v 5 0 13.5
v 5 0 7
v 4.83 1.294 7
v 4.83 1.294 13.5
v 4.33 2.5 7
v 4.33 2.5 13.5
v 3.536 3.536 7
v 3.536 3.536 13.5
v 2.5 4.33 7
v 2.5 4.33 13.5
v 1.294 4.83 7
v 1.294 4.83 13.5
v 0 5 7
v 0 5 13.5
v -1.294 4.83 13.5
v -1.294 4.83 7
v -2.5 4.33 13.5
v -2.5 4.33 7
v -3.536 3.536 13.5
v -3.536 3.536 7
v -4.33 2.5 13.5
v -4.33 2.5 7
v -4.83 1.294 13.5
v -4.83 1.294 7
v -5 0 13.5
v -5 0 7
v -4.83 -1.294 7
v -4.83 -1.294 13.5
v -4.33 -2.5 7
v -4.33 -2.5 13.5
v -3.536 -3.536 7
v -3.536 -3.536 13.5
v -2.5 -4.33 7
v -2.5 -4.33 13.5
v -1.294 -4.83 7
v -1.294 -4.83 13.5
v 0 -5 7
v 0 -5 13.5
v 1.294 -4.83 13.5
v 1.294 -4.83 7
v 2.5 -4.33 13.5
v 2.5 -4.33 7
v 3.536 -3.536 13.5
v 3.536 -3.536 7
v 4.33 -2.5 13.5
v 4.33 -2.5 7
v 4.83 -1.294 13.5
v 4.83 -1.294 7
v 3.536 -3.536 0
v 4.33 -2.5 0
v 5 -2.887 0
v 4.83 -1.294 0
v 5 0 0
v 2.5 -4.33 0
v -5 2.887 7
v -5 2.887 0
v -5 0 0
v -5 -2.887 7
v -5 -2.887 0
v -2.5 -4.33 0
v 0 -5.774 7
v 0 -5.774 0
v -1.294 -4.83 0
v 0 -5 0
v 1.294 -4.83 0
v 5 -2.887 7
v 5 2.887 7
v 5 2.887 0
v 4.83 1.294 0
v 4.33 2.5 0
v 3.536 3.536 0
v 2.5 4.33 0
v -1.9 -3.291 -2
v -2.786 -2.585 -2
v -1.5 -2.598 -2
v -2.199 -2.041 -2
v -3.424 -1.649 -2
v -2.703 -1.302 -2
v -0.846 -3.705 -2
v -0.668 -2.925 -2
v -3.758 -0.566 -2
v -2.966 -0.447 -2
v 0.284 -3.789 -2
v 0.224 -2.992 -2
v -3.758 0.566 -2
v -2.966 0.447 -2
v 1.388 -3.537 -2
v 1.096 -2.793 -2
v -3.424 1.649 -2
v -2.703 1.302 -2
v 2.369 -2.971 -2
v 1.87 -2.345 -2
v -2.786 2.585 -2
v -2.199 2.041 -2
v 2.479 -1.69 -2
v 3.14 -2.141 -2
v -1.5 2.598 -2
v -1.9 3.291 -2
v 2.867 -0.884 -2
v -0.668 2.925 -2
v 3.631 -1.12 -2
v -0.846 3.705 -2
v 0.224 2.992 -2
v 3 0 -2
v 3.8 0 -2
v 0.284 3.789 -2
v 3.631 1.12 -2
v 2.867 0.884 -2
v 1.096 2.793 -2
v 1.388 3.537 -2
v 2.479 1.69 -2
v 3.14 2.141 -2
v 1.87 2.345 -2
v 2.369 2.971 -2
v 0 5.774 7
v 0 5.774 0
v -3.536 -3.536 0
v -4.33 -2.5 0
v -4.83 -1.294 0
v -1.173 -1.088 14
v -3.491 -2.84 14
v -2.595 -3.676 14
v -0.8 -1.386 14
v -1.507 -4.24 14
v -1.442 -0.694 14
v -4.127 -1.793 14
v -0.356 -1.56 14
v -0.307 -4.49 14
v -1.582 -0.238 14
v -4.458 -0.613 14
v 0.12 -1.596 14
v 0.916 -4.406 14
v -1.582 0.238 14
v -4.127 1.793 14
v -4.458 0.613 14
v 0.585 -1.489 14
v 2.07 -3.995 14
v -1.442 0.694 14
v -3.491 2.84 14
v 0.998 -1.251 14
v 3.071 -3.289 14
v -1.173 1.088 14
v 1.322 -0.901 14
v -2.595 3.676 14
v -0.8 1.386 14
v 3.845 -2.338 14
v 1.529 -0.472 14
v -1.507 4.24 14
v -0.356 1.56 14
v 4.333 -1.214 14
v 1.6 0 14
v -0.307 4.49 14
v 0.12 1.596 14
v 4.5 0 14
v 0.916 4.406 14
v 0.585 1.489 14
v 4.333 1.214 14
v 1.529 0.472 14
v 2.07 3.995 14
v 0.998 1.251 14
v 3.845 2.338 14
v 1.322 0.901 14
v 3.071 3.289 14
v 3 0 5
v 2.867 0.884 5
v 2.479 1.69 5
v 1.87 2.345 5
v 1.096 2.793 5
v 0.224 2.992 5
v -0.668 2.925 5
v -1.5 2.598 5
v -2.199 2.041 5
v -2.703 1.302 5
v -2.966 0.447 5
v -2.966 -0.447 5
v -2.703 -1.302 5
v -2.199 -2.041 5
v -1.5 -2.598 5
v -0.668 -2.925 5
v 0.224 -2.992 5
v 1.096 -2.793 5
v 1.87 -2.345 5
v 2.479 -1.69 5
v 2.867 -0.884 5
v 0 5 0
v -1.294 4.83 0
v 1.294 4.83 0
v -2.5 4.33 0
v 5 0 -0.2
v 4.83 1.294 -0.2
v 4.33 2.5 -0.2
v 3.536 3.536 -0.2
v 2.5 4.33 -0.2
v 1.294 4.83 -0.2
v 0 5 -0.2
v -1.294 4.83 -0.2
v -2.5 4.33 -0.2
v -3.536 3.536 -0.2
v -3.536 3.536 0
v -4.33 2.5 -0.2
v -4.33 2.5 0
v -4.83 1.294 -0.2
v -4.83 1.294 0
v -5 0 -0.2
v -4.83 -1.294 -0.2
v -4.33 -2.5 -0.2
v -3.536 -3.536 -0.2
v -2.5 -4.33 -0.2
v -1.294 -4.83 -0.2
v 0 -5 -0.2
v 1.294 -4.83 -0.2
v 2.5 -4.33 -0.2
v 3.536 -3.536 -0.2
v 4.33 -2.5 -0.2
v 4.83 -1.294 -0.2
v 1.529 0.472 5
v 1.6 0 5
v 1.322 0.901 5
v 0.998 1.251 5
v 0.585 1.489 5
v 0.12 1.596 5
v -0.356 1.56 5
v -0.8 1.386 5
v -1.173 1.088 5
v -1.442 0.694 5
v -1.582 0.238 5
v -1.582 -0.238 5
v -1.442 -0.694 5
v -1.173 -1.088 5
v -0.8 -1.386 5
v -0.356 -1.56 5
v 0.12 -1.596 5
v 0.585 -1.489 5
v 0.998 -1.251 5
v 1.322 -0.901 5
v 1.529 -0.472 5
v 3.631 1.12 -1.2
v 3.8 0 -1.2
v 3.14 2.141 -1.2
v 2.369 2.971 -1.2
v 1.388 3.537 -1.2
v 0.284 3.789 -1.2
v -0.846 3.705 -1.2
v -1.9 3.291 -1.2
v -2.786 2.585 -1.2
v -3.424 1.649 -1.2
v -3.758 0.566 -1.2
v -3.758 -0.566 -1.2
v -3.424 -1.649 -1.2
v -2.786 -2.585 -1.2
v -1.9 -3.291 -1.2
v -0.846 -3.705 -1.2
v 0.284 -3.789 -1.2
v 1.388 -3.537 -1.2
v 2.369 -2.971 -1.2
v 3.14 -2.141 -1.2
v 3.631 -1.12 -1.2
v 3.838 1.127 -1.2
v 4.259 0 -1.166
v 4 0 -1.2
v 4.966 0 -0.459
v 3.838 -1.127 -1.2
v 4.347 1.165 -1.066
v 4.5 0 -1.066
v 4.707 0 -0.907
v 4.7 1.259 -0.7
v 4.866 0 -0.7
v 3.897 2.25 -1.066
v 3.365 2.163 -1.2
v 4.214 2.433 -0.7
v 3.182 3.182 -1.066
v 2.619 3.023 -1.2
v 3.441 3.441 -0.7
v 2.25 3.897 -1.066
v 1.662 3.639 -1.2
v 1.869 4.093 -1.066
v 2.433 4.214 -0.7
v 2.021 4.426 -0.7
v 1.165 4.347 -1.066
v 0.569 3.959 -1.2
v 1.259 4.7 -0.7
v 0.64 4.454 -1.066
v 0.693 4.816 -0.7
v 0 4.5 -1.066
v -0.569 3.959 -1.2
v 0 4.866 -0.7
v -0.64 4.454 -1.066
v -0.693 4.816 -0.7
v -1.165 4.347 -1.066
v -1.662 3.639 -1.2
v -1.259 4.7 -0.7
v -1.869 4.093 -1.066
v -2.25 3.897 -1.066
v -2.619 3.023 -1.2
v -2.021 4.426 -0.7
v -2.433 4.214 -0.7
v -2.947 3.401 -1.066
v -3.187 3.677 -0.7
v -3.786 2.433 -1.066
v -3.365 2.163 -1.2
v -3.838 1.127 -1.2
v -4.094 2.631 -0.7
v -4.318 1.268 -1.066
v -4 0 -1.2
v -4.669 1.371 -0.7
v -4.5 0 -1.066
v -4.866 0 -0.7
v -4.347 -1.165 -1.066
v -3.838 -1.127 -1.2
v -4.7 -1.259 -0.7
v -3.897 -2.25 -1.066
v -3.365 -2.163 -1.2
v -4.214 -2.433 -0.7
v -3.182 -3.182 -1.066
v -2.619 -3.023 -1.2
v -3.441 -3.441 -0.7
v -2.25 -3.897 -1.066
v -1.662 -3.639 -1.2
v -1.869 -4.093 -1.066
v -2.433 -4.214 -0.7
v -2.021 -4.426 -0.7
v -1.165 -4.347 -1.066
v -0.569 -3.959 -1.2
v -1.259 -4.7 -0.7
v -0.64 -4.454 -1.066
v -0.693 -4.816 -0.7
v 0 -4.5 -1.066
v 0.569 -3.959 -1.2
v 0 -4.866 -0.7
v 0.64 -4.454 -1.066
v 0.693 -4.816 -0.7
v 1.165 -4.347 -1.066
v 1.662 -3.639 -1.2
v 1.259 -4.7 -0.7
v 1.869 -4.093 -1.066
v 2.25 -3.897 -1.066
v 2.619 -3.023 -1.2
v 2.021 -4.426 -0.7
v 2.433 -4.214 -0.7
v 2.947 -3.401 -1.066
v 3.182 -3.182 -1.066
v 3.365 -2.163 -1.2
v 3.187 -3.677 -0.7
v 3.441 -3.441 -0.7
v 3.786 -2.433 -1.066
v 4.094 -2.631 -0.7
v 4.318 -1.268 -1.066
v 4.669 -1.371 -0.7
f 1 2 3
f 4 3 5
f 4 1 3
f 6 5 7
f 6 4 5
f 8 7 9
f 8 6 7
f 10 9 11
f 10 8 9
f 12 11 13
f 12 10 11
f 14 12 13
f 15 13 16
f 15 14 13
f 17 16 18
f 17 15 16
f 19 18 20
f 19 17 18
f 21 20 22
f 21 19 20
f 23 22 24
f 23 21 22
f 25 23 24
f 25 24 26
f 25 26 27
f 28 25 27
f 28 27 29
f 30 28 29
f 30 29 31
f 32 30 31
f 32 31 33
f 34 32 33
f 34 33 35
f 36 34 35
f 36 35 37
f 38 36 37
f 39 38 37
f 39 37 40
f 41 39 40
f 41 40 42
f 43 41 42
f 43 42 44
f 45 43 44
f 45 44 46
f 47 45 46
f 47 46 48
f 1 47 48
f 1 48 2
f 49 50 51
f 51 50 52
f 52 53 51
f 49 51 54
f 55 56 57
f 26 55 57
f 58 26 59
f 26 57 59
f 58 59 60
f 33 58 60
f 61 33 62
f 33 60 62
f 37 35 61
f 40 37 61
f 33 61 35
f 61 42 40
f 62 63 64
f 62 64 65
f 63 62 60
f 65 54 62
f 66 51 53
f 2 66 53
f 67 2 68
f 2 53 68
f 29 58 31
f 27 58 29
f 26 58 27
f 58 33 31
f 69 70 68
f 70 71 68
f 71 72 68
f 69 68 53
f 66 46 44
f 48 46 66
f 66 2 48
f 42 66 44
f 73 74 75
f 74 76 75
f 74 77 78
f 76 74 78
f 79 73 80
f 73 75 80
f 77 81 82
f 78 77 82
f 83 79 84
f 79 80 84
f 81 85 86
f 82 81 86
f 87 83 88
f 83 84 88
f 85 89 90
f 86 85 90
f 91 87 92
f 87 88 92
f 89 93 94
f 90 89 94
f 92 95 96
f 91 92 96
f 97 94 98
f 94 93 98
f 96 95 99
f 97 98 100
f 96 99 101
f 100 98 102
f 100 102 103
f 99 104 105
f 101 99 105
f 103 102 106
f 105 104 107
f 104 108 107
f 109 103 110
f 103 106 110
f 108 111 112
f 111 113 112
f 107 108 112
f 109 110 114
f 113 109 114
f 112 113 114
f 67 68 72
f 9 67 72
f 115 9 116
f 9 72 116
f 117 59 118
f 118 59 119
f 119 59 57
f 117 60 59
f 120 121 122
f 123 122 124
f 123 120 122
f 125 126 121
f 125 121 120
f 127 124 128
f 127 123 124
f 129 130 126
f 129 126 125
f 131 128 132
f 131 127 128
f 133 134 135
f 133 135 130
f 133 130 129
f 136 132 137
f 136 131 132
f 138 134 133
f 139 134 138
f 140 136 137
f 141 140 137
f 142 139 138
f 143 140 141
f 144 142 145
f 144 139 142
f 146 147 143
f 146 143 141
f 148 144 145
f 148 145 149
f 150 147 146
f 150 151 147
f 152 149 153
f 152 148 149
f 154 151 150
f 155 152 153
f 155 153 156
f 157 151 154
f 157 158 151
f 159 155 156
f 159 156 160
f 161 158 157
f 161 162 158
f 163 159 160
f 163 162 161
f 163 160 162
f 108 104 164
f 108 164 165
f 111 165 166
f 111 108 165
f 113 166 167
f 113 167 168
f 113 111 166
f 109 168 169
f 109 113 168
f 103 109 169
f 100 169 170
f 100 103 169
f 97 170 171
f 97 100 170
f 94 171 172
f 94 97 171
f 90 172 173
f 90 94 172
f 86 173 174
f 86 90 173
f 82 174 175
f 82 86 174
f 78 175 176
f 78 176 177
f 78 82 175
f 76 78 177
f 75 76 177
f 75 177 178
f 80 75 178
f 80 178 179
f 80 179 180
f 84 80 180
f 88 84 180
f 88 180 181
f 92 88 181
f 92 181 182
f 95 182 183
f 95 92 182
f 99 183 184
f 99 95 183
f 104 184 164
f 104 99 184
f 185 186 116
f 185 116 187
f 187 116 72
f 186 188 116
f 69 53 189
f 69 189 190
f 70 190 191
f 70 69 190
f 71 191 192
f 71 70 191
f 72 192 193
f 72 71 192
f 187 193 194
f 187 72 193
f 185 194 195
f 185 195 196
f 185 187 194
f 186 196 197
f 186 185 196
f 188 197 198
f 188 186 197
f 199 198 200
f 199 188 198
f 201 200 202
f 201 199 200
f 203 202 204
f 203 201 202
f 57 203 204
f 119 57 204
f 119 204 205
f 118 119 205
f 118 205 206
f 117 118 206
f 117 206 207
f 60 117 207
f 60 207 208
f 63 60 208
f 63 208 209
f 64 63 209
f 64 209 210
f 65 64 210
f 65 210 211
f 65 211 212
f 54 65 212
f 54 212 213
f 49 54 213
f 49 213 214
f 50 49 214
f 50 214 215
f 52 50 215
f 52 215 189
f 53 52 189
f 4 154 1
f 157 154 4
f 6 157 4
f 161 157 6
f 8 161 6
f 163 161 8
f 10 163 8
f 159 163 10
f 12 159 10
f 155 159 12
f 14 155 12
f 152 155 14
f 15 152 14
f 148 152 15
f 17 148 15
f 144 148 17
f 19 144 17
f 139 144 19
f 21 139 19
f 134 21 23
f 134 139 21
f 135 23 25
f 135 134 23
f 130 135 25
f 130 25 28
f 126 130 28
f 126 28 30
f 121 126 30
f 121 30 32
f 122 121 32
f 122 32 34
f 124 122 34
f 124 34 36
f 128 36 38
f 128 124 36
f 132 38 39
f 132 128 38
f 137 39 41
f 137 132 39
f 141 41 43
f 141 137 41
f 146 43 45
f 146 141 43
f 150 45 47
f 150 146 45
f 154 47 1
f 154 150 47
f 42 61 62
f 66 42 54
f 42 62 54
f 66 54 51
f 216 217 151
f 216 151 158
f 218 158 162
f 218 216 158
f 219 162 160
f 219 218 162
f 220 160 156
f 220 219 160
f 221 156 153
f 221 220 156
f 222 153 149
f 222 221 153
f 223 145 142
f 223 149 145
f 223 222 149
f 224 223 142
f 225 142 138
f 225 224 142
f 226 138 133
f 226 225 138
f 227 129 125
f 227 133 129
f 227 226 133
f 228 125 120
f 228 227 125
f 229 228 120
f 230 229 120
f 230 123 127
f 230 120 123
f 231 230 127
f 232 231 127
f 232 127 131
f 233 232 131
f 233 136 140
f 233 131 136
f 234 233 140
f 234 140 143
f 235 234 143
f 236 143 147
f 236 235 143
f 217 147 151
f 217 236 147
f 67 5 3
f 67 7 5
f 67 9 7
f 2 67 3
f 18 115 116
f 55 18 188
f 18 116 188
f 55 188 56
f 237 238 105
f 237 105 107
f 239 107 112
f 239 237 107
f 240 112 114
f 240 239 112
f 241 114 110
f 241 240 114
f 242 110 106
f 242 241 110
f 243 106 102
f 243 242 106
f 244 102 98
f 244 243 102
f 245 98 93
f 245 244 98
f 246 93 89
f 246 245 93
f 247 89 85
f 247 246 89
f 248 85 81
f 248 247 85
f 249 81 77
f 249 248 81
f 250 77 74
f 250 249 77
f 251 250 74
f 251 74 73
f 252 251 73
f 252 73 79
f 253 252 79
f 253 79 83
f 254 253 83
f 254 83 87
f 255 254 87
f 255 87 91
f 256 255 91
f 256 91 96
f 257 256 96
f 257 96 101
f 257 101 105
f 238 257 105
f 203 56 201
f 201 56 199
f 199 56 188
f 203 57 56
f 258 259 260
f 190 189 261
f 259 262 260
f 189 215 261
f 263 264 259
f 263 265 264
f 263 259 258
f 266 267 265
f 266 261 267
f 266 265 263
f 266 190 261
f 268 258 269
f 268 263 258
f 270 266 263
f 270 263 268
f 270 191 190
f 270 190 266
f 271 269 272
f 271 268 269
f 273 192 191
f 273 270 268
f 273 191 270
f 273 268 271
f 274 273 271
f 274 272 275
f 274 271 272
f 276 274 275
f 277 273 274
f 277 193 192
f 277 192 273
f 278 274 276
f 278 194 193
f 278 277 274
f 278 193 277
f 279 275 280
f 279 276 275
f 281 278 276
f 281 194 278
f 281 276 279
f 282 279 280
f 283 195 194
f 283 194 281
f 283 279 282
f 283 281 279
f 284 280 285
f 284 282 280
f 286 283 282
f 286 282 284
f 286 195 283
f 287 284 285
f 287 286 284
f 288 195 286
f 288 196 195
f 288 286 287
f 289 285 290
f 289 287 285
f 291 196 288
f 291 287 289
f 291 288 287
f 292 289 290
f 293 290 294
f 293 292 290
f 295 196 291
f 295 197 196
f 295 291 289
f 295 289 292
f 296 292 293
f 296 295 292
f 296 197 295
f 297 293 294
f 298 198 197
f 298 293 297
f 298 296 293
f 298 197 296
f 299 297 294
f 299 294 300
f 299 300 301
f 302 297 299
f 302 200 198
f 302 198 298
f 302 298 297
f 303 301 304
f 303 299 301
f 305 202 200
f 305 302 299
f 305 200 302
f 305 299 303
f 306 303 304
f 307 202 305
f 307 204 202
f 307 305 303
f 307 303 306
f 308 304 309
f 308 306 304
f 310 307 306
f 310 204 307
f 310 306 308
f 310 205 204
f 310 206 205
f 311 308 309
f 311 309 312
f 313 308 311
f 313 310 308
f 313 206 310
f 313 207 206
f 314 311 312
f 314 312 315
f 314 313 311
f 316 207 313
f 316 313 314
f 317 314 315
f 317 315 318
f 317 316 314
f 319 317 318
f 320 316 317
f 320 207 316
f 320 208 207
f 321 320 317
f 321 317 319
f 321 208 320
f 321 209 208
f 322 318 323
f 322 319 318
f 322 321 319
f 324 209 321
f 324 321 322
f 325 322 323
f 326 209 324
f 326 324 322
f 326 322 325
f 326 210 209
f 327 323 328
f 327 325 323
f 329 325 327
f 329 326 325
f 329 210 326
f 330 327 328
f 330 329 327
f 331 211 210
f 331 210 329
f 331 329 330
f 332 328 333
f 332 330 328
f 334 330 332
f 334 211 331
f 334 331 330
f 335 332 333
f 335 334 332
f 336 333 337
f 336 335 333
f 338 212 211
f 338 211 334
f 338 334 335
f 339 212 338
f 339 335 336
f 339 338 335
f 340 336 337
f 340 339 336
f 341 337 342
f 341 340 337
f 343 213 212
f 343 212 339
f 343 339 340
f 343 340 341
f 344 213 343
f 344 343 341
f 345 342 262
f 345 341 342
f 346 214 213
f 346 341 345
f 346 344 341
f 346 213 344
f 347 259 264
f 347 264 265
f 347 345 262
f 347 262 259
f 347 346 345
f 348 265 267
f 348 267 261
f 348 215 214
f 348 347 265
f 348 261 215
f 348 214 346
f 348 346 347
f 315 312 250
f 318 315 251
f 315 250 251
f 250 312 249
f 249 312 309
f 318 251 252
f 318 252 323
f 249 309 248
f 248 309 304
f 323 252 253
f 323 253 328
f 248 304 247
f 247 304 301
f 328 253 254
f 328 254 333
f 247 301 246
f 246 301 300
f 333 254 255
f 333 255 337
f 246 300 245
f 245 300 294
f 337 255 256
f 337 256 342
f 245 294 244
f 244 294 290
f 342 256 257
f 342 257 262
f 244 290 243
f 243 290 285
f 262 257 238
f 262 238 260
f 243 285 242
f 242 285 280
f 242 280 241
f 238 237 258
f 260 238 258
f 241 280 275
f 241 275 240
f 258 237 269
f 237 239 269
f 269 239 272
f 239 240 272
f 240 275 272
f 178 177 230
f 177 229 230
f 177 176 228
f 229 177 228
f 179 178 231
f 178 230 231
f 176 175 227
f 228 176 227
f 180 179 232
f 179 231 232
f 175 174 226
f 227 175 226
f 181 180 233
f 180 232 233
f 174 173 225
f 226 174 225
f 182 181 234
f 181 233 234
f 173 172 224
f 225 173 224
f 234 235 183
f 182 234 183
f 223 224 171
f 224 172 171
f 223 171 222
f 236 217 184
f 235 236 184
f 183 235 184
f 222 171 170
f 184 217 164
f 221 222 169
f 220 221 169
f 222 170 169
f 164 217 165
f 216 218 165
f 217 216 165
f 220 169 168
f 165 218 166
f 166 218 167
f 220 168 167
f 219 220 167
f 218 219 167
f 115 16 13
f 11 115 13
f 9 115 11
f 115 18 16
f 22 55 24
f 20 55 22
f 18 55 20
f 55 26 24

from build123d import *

# Parameters (mm, degrees)
EXTRUDE_2_DEPTH      = 7
SKETCH_1_4_R         = 5
EXTRUDE_3_DEPTH      = 1.2
EXTRUDE_START        = 14
SKETCH_1_5_R         = 5
EXTRUDE_4_DEPTH      = 14
SKETCH_1_6_R         = 4.3
EXTRUDE_5_DEPTH      = 9
SKETCH_1_8_R         = 3.8
EXTRUDE_6_DEPTH      = 2
FILLET_1_R           = 1
CUT_EXTRUDE_START    = -2
SKETCH_1_10_R        = 1.6
CUT_EXTRUDE_31_DEPTH = 18.947831619
SKETCH_1_11_R        = 3
CUT_EXTRUDE_32_DEPTH = 7
CHAMFER_1_SIZE       = 0.5


with BuildPart() as part:
    # Эскиз1 → Бобышка-Вытянуть2 (new body)
    with BuildSketch(Plane.XY):
        Polygon((0, 5.773502692), (-5, 2.886751346), (-5, -2.886751346), (0, -5.773502692), (5, -2.886751346), (5, 2.886751346), align=None)
    extrude(amount=EXTRUDE_2_DEPTH)

    # Эскиз1<4> → Бобышка-Вытянуть3 (add)
    with BuildSketch(Plane.XY):
        Circle(SKETCH_1_4_R)
    extrude(amount=-EXTRUDE_3_DEPTH)

    # Эскиз1<5> → Бобышка-Вытянуть4 (add)
    with BuildSketch(Plane.XY.offset(EXTRUDE_START)):
        Circle(SKETCH_1_5_R)
    extrude(amount=-EXTRUDE_4_DEPTH)

    # Эскиз1<6> → Бобышка-Вытянуть5 (add)
    with BuildSketch(Plane.XY):
        Circle(SKETCH_1_6_R)
    extrude(amount=EXTRUDE_5_DEPTH)

    # Эскиз1<8> → Бобышка-Вытянуть6 (add)
    with BuildSketch(Plane.XY):
        Circle(SKETCH_1_8_R)
    extrude(amount=-EXTRUDE_6_DEPTH)

    # Скругление1
    fillet_1_edges = [part.edges().sort_by_distance(p)[0] for p in [
        (-5, 0, -1.2),
    ]]
    fillet(fillet_1_edges, radius=FILLET_1_R)

    # Эскиз1<10> → Вырез-Вытянуть31 (cut, through all)
    with BuildSketch(Plane.XY.offset(CUT_EXTRUDE_START)):
        Circle(SKETCH_1_10_R)
    extrude(amount=CUT_EXTRUDE_31_DEPTH, mode=Mode.SUBTRACT)

    # Эскиз1<11> → Вырез-Вытянуть32 (cut)
    with BuildSketch(Plane.XY.offset(CUT_EXTRUDE_START)):
        Circle(SKETCH_1_11_R)
    extrude(amount=CUT_EXTRUDE_32_DEPTH, mode=Mode.SUBTRACT)

    # Фаска1
    chamfer_1_edges = [part.edges().sort_by_distance(p)[0] for p in [
        (-5, 0, 14),
    ]]
    chamfer(chamfer_1_edges, length=CHAMFER_1_SIZE)


solid = part.part
